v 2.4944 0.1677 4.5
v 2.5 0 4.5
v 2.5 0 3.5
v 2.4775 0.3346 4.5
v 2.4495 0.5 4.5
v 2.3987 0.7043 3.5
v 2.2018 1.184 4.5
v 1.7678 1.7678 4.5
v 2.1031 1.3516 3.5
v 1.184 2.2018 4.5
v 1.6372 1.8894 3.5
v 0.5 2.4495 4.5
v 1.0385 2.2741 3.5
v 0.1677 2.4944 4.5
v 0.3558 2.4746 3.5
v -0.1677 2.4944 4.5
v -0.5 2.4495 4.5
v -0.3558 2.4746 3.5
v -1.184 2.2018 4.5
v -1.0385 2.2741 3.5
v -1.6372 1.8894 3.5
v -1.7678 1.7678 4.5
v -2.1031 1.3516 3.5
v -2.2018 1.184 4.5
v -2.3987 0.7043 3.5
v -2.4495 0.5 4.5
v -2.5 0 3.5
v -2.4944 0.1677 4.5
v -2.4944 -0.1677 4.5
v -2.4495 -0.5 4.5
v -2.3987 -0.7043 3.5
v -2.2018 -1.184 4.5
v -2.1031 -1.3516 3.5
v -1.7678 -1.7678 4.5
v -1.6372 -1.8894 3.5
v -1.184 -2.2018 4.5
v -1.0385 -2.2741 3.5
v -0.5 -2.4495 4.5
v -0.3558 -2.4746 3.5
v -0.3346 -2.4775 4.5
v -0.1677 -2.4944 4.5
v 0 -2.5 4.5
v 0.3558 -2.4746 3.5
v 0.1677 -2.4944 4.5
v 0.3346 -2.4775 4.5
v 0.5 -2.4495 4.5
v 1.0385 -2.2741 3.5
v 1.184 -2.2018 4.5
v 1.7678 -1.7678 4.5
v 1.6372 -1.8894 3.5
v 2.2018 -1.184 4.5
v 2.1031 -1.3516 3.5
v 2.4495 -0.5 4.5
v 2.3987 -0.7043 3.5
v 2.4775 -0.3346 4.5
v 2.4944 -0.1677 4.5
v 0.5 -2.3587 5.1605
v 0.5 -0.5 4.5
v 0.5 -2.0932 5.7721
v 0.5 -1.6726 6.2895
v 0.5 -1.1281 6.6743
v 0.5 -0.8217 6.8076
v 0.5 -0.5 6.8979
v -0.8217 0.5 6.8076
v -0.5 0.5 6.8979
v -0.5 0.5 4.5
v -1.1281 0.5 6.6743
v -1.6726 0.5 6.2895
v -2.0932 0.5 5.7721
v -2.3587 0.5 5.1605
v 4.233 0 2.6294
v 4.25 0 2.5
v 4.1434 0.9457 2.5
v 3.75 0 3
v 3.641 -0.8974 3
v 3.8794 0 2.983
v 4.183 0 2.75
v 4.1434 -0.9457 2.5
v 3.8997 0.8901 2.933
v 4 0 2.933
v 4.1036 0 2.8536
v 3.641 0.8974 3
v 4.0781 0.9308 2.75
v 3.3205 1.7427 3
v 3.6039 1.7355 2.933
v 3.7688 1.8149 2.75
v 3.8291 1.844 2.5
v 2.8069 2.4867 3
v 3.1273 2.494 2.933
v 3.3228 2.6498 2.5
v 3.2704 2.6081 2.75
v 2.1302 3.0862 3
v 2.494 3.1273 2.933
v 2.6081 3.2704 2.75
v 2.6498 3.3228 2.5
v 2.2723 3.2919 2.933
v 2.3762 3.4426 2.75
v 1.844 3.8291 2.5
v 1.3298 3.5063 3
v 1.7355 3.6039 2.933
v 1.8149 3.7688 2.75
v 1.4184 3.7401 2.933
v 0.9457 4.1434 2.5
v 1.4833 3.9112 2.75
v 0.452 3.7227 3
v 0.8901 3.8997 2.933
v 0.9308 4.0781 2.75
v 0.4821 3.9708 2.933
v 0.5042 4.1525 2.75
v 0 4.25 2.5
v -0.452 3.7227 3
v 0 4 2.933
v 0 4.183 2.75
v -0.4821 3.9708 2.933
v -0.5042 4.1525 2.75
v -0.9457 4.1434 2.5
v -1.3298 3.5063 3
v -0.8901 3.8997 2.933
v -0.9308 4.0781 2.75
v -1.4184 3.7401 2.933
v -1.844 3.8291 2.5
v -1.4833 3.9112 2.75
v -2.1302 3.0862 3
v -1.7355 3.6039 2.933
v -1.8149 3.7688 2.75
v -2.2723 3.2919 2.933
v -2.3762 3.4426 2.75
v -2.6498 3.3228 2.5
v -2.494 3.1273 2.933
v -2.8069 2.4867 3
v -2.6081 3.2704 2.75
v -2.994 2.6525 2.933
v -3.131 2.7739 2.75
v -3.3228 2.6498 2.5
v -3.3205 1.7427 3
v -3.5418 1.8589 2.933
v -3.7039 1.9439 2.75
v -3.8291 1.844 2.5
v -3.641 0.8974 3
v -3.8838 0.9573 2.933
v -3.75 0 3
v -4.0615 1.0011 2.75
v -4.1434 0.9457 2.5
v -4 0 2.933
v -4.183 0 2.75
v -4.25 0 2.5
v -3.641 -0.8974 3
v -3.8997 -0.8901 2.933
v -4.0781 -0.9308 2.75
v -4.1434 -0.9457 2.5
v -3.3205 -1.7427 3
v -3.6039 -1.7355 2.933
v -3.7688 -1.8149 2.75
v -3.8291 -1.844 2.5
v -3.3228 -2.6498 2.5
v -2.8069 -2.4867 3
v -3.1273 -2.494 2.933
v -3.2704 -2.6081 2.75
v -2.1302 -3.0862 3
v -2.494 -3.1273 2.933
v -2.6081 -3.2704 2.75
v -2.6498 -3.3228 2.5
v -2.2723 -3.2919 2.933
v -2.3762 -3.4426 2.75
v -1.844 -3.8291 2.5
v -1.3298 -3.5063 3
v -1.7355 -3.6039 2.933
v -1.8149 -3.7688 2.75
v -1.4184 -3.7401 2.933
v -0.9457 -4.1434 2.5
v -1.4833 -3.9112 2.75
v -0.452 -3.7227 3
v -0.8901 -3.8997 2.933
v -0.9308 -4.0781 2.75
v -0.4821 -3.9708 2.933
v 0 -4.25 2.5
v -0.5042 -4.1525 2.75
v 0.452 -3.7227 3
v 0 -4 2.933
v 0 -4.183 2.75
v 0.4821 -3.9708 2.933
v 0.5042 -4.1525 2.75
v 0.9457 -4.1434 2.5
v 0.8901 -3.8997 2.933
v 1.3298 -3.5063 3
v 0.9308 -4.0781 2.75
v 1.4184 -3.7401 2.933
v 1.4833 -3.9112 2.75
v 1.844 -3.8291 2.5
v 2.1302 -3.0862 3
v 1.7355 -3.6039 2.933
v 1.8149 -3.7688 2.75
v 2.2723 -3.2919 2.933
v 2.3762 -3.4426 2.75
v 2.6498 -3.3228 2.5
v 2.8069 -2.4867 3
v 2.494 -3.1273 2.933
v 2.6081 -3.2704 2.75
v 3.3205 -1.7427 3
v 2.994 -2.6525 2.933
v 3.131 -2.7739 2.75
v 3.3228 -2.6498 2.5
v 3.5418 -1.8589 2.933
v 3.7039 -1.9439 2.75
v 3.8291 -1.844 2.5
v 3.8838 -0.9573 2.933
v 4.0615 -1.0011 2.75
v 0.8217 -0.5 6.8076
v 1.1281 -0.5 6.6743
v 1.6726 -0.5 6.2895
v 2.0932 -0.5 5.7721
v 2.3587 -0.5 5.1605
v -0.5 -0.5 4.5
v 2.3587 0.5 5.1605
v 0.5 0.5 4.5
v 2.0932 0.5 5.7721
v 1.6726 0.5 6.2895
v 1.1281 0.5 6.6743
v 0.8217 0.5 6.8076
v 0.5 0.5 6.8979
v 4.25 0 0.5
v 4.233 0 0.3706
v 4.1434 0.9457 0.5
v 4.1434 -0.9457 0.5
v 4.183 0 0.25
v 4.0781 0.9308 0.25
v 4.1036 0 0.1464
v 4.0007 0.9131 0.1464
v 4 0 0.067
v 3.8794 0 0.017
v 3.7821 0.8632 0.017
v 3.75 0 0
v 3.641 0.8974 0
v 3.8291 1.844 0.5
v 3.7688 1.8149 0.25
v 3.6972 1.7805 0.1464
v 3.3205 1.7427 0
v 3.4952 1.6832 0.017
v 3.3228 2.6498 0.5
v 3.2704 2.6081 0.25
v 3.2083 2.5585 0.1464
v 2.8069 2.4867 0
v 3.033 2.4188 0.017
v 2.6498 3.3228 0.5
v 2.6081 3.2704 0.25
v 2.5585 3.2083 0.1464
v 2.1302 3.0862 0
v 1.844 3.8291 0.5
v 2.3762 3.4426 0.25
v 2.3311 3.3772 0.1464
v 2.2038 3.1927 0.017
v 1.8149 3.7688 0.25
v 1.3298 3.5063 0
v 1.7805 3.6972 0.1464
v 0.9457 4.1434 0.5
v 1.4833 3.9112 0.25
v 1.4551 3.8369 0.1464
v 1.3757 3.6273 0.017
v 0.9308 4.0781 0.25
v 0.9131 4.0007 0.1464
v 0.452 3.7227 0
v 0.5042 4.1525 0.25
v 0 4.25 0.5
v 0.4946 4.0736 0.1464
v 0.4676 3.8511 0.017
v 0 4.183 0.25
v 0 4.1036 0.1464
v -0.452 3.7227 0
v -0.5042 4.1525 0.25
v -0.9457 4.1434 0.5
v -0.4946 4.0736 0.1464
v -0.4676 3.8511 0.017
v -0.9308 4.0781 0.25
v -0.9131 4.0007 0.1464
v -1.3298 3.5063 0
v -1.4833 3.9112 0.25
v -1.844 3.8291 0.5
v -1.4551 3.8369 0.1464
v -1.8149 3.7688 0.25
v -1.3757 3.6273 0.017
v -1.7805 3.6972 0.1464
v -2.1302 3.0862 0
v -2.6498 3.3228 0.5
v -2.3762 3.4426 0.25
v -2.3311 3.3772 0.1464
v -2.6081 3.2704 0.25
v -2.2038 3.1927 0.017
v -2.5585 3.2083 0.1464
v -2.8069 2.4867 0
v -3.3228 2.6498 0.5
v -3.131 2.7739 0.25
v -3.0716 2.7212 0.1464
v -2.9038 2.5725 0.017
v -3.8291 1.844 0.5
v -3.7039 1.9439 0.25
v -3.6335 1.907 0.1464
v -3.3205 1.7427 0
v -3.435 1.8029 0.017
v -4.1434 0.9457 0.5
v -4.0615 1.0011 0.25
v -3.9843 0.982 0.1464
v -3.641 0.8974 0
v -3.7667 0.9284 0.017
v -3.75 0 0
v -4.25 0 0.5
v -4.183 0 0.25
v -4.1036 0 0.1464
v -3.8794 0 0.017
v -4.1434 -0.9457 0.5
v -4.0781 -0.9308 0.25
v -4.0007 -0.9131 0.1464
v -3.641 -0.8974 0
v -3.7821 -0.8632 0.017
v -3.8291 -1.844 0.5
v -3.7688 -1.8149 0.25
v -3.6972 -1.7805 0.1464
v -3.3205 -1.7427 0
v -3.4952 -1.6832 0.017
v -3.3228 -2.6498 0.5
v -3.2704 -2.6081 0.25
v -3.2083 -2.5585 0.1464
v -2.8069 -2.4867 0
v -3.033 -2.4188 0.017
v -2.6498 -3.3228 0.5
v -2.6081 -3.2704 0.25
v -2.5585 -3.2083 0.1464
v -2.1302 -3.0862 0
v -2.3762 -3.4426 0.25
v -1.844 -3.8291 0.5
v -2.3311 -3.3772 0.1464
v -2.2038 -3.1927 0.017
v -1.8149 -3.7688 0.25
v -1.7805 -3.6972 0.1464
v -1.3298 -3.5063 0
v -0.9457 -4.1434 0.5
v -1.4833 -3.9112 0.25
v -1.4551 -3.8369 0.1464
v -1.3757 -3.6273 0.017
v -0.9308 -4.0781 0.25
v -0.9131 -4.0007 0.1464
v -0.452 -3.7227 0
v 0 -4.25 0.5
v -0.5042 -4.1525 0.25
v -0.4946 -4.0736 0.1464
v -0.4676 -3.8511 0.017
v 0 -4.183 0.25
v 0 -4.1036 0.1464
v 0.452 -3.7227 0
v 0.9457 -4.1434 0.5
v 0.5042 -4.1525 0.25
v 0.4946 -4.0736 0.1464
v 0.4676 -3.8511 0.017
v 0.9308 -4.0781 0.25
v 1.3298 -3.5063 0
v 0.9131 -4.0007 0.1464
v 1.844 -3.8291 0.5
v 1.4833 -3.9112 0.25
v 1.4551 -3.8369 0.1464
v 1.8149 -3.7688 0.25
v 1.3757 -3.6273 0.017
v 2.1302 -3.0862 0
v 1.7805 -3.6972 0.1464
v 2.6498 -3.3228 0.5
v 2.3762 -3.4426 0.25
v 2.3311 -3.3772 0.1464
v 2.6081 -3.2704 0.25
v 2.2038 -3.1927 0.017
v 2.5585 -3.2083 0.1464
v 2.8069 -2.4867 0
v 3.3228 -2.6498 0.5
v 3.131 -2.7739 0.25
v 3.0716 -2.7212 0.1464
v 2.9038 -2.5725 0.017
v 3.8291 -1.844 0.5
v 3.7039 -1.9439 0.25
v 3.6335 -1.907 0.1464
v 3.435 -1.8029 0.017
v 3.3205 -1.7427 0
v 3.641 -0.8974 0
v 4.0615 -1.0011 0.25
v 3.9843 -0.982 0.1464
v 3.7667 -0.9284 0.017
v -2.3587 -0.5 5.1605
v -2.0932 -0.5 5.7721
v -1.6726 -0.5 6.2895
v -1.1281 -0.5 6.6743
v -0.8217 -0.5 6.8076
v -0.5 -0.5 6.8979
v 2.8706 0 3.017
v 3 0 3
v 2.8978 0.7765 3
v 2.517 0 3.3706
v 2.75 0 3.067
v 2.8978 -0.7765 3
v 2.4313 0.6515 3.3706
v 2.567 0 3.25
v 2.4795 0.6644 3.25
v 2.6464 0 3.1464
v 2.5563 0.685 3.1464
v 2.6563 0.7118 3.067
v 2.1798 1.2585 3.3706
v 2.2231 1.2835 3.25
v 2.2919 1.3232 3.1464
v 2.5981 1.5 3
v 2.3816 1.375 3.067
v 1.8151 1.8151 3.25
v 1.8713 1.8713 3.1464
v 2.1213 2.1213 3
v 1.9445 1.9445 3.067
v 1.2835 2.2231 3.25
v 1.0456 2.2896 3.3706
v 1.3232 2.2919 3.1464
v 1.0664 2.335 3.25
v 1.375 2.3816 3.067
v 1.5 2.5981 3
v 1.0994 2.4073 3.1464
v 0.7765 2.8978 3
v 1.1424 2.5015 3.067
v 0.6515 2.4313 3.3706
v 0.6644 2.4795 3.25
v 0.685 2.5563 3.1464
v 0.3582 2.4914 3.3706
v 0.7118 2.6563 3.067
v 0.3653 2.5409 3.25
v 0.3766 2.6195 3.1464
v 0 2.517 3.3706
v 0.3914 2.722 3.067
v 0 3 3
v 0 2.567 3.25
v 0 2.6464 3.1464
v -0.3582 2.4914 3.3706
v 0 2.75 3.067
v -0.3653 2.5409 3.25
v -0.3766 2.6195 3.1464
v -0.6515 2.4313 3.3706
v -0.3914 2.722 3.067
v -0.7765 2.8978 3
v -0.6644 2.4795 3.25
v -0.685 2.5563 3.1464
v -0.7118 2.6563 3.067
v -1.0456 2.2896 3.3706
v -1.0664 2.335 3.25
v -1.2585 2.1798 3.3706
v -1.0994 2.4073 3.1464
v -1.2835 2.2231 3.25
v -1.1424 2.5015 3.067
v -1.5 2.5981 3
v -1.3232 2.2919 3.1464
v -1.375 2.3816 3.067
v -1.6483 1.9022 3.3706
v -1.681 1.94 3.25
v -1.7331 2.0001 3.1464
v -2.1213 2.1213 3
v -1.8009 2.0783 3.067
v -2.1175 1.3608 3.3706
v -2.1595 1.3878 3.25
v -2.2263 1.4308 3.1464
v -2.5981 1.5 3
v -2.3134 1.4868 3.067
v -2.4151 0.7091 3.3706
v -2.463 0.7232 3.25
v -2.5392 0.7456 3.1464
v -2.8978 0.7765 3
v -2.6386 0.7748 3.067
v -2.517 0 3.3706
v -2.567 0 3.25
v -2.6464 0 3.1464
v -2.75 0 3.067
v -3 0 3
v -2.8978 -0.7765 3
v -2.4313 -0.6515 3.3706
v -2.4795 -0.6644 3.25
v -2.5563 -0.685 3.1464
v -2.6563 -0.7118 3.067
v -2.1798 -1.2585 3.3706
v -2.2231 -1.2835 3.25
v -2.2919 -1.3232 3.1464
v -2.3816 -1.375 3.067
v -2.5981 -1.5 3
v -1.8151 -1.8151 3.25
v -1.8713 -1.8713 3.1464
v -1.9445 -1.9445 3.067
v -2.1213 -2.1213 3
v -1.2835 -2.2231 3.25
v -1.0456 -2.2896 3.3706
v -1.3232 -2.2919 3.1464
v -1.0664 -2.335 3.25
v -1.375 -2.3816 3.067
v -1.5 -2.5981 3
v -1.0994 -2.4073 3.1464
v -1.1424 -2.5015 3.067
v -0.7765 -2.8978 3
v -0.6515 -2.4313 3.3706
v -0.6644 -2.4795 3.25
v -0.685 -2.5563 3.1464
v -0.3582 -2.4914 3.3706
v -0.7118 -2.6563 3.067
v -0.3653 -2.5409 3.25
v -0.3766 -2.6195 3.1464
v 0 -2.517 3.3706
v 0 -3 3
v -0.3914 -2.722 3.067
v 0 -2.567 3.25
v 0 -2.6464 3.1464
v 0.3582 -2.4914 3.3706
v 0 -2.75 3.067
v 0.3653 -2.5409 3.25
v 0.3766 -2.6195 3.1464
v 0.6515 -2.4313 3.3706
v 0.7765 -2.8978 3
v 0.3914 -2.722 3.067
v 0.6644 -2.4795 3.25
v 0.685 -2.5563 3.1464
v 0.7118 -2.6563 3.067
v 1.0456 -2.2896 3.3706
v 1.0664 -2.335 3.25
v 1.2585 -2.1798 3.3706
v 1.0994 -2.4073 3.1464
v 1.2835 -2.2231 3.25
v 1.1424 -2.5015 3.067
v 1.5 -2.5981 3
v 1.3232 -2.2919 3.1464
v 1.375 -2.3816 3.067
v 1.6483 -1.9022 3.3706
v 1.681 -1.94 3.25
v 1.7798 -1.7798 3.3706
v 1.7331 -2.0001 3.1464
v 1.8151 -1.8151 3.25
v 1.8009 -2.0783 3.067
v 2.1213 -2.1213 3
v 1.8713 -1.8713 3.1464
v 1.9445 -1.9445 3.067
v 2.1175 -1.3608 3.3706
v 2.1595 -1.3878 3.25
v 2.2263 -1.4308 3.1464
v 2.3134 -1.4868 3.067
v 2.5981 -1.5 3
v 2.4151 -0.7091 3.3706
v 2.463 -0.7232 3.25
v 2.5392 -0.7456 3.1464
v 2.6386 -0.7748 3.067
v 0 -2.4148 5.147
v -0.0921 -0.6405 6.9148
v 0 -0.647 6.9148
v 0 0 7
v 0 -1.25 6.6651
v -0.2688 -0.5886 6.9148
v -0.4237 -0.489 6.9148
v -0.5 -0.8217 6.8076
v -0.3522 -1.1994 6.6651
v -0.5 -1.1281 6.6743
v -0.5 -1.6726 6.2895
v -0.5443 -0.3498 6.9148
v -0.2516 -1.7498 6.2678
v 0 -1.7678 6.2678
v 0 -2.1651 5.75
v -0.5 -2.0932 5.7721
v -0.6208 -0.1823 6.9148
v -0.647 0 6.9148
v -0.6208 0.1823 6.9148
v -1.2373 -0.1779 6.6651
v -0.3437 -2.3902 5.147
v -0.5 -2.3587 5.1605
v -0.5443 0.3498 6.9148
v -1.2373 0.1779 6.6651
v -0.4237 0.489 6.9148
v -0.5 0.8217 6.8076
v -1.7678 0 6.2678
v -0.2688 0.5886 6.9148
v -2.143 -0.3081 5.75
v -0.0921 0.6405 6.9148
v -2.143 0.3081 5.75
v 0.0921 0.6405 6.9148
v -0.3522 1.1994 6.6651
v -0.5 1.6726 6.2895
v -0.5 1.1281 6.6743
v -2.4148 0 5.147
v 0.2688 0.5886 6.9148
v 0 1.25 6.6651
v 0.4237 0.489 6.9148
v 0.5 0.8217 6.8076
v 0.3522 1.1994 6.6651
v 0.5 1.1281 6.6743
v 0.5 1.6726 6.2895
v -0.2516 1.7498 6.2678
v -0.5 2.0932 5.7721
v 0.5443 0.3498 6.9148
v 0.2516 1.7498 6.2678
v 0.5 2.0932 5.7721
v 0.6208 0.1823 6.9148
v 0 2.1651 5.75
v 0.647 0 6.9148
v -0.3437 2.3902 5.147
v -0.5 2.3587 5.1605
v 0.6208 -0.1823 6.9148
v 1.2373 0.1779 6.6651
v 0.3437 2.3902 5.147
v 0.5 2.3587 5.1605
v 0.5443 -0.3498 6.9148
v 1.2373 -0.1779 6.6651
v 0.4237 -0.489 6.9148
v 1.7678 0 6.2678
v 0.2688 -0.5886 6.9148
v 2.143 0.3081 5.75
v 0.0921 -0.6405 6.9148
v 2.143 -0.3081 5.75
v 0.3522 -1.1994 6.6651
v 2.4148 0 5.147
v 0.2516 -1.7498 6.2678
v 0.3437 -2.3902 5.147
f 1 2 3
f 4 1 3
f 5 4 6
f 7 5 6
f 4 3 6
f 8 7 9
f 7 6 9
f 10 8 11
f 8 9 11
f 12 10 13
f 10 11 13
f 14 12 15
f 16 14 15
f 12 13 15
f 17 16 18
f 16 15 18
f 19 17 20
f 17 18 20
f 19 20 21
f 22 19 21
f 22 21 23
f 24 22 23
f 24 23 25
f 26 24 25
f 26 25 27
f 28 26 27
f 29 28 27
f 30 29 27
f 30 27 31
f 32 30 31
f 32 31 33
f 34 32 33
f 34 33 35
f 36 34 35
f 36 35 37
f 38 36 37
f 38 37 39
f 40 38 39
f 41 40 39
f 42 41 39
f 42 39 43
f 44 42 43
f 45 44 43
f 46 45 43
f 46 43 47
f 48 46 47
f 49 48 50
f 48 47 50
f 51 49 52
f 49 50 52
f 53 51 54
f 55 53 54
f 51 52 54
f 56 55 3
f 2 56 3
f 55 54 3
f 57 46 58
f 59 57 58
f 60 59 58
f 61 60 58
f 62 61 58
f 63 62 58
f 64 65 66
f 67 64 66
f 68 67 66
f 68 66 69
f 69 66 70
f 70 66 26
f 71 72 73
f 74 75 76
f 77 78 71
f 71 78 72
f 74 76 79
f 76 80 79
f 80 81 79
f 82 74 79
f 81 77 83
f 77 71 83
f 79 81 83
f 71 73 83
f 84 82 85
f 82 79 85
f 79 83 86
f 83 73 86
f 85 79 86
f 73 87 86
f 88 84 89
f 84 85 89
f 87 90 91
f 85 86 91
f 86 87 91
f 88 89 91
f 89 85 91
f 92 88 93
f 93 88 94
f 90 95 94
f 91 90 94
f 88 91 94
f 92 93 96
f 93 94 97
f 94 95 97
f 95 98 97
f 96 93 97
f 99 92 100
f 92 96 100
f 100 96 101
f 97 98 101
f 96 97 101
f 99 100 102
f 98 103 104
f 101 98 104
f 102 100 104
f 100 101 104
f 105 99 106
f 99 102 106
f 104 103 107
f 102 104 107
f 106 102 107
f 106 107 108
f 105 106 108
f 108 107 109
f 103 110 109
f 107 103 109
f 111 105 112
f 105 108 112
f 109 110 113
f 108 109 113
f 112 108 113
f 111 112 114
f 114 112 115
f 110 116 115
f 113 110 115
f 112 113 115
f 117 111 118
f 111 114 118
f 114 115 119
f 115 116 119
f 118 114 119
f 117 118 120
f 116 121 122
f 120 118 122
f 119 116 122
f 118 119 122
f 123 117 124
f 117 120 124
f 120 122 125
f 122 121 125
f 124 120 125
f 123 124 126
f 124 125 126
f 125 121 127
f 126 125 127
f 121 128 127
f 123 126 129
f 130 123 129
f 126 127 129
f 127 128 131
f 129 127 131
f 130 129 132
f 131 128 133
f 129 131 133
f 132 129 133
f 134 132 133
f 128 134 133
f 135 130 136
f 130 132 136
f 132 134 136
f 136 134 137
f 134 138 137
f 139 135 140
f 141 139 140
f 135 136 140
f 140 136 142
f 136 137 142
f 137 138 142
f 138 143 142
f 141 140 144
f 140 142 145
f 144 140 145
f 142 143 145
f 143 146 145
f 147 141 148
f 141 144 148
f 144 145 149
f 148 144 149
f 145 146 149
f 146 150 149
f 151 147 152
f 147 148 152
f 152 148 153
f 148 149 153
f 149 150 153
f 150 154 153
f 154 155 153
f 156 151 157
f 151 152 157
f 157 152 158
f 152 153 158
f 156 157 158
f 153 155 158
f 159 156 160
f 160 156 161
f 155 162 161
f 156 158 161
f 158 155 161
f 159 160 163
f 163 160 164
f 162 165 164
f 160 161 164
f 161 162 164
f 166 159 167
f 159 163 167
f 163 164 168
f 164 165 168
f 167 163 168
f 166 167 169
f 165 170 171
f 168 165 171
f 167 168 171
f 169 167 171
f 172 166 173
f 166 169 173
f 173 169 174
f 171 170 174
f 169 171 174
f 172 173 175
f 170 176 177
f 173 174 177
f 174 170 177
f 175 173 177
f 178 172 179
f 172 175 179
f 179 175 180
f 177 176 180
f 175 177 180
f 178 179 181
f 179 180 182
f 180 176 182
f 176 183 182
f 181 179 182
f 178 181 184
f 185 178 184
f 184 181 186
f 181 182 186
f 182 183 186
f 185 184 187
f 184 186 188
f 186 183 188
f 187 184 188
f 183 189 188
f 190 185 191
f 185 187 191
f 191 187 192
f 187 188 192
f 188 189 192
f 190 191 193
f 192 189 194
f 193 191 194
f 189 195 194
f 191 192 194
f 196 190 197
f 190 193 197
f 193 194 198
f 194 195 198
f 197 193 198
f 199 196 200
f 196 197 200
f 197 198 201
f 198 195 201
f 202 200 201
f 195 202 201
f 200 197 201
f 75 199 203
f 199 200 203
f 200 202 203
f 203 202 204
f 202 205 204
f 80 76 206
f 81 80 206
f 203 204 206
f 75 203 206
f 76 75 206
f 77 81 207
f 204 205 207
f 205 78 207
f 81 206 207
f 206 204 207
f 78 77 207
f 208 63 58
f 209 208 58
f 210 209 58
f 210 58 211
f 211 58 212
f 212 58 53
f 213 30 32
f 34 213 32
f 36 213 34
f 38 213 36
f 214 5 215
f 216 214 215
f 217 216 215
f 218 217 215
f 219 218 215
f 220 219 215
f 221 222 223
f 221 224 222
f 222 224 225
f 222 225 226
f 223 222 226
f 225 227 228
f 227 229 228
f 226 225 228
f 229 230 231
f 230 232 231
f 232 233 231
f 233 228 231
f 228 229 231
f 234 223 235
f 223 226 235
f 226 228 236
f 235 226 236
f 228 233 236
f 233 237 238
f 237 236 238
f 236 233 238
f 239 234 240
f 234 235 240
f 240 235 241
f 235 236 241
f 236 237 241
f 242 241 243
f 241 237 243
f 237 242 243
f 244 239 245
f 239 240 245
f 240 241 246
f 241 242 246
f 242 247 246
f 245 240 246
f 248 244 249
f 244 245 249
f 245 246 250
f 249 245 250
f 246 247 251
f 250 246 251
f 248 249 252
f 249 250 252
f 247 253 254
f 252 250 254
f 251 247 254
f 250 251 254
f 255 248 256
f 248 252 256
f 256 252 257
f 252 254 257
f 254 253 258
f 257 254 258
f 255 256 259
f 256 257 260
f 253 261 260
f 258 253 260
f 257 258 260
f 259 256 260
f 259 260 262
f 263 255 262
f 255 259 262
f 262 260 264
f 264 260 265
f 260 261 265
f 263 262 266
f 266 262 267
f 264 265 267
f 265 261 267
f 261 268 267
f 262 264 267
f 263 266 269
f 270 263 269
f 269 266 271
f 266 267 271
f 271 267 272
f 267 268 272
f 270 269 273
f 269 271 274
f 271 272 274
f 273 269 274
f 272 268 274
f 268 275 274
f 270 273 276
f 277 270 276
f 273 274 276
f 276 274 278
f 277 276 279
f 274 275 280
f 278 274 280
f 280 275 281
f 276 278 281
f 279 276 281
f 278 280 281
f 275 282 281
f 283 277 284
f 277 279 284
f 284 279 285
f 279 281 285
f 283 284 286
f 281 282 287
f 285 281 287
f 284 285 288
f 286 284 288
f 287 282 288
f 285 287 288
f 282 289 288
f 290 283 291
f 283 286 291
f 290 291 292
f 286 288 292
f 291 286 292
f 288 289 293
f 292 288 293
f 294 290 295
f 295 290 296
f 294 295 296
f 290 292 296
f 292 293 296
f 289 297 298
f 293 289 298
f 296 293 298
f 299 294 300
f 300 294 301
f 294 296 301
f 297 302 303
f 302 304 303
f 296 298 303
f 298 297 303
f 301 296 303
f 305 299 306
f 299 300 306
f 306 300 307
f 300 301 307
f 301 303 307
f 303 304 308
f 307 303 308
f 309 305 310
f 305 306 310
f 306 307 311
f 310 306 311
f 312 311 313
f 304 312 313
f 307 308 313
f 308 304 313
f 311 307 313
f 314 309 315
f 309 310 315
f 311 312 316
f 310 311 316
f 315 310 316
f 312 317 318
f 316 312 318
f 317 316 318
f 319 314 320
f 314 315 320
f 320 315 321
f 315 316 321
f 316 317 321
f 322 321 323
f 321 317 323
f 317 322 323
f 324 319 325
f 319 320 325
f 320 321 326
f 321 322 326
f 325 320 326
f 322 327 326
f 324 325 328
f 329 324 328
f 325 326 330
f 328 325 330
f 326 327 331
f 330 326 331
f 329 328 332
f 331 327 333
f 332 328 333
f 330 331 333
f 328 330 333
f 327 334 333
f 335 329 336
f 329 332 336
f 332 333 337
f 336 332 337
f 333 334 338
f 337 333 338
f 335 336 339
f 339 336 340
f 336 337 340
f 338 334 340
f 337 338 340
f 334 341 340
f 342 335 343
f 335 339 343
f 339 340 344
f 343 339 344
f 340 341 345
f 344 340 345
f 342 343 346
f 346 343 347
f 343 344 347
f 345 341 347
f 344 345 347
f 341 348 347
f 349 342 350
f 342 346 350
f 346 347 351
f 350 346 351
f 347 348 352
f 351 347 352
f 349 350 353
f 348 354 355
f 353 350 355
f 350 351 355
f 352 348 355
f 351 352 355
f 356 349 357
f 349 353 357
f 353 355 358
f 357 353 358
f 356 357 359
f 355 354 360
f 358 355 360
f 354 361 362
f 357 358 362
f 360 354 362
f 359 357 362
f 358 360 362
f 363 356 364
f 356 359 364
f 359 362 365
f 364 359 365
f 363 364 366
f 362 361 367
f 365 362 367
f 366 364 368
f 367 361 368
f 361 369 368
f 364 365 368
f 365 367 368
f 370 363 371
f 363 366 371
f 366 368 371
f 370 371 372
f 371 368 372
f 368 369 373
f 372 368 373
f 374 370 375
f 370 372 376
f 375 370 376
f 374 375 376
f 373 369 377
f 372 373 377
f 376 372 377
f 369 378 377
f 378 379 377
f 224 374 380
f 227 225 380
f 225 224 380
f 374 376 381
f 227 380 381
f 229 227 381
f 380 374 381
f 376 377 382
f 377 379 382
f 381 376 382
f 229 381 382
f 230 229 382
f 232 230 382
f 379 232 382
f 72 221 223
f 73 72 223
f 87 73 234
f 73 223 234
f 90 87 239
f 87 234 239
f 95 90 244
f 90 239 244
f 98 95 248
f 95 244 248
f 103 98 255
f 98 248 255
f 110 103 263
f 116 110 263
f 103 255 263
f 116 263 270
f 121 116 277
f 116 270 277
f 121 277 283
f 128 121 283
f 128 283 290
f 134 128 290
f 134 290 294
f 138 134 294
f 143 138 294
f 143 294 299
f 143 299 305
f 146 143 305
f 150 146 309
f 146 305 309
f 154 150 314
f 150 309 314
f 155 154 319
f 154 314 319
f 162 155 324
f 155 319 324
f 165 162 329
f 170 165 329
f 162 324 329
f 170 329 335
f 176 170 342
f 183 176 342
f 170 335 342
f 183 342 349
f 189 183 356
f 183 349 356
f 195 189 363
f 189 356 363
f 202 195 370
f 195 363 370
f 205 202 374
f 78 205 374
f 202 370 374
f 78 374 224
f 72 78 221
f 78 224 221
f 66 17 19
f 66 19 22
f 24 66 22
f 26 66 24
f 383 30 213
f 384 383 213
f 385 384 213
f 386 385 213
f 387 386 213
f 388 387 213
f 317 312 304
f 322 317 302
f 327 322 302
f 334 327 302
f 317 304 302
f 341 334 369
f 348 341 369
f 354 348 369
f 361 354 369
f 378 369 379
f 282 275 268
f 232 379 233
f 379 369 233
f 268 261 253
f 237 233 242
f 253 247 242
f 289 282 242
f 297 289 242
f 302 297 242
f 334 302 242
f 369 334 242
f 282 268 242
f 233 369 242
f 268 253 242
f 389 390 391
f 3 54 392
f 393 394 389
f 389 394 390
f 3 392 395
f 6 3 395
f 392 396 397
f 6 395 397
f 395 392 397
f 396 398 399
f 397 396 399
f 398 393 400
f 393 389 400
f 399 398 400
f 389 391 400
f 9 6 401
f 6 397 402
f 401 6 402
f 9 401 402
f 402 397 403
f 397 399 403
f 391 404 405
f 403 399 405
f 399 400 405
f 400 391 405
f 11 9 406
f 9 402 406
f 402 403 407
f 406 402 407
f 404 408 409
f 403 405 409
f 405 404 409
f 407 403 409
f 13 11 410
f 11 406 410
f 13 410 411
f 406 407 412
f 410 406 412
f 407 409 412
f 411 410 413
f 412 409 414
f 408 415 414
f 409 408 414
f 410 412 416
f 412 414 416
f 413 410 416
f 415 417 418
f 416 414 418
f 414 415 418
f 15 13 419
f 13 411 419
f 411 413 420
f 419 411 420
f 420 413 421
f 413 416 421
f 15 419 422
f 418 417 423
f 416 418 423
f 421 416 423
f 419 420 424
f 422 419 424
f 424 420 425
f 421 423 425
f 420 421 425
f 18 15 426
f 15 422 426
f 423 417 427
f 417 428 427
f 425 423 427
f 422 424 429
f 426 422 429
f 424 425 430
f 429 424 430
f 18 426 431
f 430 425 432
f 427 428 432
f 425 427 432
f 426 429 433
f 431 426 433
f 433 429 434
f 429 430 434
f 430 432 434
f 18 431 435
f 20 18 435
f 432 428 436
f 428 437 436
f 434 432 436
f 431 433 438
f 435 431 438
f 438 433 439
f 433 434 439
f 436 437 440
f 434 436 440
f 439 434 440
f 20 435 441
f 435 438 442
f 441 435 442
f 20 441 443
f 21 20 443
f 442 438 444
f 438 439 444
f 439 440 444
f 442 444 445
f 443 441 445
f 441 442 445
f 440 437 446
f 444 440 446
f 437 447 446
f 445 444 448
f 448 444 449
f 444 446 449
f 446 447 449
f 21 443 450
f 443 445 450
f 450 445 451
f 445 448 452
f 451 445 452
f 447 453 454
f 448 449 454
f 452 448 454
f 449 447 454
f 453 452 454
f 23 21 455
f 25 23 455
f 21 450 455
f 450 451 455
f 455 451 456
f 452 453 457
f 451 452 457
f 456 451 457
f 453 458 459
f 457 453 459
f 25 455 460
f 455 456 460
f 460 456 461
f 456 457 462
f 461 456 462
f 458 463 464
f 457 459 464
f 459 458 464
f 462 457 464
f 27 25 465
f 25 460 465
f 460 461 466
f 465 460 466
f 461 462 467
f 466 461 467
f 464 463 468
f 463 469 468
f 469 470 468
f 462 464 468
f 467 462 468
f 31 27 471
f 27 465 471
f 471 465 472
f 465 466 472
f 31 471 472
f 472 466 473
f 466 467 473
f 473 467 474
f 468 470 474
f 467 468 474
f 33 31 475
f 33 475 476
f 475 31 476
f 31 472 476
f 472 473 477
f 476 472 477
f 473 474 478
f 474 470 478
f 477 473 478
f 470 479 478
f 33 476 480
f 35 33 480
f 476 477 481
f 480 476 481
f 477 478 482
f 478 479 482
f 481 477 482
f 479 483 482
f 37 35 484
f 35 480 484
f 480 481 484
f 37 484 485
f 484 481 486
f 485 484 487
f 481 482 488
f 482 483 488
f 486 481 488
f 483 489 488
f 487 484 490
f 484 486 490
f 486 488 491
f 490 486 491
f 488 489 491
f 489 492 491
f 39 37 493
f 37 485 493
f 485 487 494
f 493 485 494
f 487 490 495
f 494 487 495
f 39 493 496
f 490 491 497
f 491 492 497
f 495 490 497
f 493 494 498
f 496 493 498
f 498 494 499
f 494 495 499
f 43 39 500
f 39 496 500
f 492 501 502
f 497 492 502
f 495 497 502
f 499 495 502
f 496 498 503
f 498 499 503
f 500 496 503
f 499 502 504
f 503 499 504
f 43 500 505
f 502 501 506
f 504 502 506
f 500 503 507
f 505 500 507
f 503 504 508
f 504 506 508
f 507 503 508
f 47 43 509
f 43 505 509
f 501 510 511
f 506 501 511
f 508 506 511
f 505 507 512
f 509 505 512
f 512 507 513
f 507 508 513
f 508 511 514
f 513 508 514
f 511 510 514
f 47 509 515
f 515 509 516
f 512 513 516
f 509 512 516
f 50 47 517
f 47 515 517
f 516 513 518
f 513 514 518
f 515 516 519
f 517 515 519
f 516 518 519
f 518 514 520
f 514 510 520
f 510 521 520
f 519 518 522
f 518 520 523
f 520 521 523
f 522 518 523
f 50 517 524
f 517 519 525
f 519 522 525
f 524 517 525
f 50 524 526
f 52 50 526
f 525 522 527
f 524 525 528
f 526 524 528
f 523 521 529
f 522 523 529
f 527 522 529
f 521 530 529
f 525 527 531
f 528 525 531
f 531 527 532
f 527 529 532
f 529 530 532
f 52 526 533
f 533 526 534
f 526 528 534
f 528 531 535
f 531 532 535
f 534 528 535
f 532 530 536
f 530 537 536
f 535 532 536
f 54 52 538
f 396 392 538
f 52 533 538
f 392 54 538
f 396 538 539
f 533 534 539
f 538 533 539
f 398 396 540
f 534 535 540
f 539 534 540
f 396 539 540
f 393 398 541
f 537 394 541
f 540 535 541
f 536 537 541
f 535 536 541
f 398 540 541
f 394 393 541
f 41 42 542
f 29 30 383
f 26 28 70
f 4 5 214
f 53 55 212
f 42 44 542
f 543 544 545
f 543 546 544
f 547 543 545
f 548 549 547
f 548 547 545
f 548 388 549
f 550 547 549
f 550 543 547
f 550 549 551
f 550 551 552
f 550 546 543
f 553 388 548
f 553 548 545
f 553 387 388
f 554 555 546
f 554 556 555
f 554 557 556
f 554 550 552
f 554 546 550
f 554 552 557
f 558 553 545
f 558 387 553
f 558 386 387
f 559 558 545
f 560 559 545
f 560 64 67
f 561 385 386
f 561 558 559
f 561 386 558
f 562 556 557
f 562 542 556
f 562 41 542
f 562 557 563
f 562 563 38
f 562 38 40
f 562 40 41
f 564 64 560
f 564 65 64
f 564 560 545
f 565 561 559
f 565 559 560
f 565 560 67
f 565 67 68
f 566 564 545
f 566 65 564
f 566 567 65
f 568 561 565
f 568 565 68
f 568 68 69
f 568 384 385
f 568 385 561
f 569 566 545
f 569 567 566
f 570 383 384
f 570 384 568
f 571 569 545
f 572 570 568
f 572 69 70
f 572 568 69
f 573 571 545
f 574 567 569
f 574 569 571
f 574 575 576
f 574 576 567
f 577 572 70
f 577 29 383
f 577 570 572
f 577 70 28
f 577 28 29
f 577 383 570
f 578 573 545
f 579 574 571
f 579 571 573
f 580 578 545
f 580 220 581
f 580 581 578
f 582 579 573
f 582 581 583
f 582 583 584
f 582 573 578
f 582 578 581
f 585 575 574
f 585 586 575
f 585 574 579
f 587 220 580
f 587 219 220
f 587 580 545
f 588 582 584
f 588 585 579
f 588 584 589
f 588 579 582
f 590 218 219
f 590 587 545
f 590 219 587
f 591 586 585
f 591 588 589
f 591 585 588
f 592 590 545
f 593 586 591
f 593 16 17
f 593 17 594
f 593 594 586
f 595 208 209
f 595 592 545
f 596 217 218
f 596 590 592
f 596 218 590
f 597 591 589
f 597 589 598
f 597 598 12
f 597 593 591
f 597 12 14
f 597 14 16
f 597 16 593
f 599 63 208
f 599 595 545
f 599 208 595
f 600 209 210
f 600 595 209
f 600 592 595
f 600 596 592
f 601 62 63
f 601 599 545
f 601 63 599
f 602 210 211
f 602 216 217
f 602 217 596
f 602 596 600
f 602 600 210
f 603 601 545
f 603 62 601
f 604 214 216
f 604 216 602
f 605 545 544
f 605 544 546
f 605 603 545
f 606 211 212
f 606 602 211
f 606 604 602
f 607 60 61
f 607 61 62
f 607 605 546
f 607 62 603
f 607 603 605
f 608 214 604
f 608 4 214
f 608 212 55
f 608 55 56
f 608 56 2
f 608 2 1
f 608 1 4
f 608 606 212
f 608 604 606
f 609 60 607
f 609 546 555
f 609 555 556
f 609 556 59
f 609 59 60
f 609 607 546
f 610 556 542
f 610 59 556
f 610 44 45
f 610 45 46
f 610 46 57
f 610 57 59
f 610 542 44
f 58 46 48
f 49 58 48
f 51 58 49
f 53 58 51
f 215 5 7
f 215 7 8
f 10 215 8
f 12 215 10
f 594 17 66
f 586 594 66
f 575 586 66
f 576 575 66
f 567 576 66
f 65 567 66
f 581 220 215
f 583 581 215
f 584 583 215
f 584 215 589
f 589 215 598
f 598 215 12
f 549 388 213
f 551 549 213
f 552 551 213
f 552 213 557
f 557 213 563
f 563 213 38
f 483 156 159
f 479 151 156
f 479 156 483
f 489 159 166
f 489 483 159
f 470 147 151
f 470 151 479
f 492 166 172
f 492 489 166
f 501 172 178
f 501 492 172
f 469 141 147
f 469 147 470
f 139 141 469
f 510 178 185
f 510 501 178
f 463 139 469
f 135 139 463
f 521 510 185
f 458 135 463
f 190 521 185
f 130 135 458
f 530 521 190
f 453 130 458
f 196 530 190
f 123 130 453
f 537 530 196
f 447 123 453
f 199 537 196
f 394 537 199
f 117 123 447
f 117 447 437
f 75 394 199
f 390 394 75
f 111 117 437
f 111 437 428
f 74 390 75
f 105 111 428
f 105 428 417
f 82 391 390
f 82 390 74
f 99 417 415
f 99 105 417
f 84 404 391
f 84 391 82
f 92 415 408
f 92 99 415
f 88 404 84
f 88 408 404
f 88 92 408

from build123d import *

# Parameters (mm, degrees)
F0_R     = 4.25
F1_DEPTH = 3
F2_R     = 2.5
F3_DEPTH = 1.5
F6_W     = 3
F6_H     = 3
F7_DEPTH = 25
F8_COUNT = 4
F10_R    = 0.5


with BuildPart() as f1:
    # F0 (on Top) → F1 (new body)
    with BuildSketch(Plane.XY):
        Circle(F0_R)
    extrude(amount=F1_DEPTH)

    # F2 (on face) → F3 (join)
    with BuildSketch(Plane.XY.offset(3)):
        Circle(F2_R)
    extrude(amount=F3_DEPTH)

    # F4 (on Right) → F5 (revolve)
    with BuildSketch(Plane.YZ):
        with BuildLine():
            Line((-2.5, 4.5), (0, 4.5))
            Line((0, 4.5), (0, 7))
            ThreePointArc((0, 7), (-1.767766953, 6.267766953), (-2.5, 4.5))
        make_face()
    revolve(axis=Axis((0, 0, 5.75), (0, 0, -1)))


with BuildPart() as f7:
    # F6 (on face) → F7 (new body)
    with BuildSketch(Plane.XY.offset(4.5)):
        with Locations((2, -2)):
            Rectangle(F6_W, F6_H)
    extrude(amount=F7_DEPTH)


with BuildPart() as f8_1:
    # F8: instance of F7
    add(f7.part.rotate(Axis((0, 0, 5.75), (0, 0, -1)), 1 * 360 / F8_COUNT))


with BuildPart() as f8_2:
    # F8: instance of F7
    add(f7.part.rotate(Axis((0, 0, 5.75), (0, 0, -1)), 2 * 360 / F8_COUNT))


with BuildPart() as f8_3:
    # F8: instance of F7
    add(f7.part.rotate(Axis((0, 0, 5.75), (0, 0, -1)), 3 * 360 / F8_COUNT))


with BuildPart() as f1_1:
    add(f1.part)

    # F9: cut F8_1, F8_2, F8_3, F7
    add(f8_1.part, mode=Mode.SUBTRACT)
    add(f8_2.part, mode=Mode.SUBTRACT)
    add(f8_3.part, mode=Mode.SUBTRACT)
    add(f7.part, mode=Mode.SUBTRACT)

    # F10
    f10_edges = [f1_1.edges().sort_by_distance(p)[0] for p in [
        (-4.25, 0, 3),
        (-4.25, 0, 0),
        (-2.5, 0, 3),
    ]]
    fillet(f10_edges, radius=F10_R)


solid = f1_1.part
